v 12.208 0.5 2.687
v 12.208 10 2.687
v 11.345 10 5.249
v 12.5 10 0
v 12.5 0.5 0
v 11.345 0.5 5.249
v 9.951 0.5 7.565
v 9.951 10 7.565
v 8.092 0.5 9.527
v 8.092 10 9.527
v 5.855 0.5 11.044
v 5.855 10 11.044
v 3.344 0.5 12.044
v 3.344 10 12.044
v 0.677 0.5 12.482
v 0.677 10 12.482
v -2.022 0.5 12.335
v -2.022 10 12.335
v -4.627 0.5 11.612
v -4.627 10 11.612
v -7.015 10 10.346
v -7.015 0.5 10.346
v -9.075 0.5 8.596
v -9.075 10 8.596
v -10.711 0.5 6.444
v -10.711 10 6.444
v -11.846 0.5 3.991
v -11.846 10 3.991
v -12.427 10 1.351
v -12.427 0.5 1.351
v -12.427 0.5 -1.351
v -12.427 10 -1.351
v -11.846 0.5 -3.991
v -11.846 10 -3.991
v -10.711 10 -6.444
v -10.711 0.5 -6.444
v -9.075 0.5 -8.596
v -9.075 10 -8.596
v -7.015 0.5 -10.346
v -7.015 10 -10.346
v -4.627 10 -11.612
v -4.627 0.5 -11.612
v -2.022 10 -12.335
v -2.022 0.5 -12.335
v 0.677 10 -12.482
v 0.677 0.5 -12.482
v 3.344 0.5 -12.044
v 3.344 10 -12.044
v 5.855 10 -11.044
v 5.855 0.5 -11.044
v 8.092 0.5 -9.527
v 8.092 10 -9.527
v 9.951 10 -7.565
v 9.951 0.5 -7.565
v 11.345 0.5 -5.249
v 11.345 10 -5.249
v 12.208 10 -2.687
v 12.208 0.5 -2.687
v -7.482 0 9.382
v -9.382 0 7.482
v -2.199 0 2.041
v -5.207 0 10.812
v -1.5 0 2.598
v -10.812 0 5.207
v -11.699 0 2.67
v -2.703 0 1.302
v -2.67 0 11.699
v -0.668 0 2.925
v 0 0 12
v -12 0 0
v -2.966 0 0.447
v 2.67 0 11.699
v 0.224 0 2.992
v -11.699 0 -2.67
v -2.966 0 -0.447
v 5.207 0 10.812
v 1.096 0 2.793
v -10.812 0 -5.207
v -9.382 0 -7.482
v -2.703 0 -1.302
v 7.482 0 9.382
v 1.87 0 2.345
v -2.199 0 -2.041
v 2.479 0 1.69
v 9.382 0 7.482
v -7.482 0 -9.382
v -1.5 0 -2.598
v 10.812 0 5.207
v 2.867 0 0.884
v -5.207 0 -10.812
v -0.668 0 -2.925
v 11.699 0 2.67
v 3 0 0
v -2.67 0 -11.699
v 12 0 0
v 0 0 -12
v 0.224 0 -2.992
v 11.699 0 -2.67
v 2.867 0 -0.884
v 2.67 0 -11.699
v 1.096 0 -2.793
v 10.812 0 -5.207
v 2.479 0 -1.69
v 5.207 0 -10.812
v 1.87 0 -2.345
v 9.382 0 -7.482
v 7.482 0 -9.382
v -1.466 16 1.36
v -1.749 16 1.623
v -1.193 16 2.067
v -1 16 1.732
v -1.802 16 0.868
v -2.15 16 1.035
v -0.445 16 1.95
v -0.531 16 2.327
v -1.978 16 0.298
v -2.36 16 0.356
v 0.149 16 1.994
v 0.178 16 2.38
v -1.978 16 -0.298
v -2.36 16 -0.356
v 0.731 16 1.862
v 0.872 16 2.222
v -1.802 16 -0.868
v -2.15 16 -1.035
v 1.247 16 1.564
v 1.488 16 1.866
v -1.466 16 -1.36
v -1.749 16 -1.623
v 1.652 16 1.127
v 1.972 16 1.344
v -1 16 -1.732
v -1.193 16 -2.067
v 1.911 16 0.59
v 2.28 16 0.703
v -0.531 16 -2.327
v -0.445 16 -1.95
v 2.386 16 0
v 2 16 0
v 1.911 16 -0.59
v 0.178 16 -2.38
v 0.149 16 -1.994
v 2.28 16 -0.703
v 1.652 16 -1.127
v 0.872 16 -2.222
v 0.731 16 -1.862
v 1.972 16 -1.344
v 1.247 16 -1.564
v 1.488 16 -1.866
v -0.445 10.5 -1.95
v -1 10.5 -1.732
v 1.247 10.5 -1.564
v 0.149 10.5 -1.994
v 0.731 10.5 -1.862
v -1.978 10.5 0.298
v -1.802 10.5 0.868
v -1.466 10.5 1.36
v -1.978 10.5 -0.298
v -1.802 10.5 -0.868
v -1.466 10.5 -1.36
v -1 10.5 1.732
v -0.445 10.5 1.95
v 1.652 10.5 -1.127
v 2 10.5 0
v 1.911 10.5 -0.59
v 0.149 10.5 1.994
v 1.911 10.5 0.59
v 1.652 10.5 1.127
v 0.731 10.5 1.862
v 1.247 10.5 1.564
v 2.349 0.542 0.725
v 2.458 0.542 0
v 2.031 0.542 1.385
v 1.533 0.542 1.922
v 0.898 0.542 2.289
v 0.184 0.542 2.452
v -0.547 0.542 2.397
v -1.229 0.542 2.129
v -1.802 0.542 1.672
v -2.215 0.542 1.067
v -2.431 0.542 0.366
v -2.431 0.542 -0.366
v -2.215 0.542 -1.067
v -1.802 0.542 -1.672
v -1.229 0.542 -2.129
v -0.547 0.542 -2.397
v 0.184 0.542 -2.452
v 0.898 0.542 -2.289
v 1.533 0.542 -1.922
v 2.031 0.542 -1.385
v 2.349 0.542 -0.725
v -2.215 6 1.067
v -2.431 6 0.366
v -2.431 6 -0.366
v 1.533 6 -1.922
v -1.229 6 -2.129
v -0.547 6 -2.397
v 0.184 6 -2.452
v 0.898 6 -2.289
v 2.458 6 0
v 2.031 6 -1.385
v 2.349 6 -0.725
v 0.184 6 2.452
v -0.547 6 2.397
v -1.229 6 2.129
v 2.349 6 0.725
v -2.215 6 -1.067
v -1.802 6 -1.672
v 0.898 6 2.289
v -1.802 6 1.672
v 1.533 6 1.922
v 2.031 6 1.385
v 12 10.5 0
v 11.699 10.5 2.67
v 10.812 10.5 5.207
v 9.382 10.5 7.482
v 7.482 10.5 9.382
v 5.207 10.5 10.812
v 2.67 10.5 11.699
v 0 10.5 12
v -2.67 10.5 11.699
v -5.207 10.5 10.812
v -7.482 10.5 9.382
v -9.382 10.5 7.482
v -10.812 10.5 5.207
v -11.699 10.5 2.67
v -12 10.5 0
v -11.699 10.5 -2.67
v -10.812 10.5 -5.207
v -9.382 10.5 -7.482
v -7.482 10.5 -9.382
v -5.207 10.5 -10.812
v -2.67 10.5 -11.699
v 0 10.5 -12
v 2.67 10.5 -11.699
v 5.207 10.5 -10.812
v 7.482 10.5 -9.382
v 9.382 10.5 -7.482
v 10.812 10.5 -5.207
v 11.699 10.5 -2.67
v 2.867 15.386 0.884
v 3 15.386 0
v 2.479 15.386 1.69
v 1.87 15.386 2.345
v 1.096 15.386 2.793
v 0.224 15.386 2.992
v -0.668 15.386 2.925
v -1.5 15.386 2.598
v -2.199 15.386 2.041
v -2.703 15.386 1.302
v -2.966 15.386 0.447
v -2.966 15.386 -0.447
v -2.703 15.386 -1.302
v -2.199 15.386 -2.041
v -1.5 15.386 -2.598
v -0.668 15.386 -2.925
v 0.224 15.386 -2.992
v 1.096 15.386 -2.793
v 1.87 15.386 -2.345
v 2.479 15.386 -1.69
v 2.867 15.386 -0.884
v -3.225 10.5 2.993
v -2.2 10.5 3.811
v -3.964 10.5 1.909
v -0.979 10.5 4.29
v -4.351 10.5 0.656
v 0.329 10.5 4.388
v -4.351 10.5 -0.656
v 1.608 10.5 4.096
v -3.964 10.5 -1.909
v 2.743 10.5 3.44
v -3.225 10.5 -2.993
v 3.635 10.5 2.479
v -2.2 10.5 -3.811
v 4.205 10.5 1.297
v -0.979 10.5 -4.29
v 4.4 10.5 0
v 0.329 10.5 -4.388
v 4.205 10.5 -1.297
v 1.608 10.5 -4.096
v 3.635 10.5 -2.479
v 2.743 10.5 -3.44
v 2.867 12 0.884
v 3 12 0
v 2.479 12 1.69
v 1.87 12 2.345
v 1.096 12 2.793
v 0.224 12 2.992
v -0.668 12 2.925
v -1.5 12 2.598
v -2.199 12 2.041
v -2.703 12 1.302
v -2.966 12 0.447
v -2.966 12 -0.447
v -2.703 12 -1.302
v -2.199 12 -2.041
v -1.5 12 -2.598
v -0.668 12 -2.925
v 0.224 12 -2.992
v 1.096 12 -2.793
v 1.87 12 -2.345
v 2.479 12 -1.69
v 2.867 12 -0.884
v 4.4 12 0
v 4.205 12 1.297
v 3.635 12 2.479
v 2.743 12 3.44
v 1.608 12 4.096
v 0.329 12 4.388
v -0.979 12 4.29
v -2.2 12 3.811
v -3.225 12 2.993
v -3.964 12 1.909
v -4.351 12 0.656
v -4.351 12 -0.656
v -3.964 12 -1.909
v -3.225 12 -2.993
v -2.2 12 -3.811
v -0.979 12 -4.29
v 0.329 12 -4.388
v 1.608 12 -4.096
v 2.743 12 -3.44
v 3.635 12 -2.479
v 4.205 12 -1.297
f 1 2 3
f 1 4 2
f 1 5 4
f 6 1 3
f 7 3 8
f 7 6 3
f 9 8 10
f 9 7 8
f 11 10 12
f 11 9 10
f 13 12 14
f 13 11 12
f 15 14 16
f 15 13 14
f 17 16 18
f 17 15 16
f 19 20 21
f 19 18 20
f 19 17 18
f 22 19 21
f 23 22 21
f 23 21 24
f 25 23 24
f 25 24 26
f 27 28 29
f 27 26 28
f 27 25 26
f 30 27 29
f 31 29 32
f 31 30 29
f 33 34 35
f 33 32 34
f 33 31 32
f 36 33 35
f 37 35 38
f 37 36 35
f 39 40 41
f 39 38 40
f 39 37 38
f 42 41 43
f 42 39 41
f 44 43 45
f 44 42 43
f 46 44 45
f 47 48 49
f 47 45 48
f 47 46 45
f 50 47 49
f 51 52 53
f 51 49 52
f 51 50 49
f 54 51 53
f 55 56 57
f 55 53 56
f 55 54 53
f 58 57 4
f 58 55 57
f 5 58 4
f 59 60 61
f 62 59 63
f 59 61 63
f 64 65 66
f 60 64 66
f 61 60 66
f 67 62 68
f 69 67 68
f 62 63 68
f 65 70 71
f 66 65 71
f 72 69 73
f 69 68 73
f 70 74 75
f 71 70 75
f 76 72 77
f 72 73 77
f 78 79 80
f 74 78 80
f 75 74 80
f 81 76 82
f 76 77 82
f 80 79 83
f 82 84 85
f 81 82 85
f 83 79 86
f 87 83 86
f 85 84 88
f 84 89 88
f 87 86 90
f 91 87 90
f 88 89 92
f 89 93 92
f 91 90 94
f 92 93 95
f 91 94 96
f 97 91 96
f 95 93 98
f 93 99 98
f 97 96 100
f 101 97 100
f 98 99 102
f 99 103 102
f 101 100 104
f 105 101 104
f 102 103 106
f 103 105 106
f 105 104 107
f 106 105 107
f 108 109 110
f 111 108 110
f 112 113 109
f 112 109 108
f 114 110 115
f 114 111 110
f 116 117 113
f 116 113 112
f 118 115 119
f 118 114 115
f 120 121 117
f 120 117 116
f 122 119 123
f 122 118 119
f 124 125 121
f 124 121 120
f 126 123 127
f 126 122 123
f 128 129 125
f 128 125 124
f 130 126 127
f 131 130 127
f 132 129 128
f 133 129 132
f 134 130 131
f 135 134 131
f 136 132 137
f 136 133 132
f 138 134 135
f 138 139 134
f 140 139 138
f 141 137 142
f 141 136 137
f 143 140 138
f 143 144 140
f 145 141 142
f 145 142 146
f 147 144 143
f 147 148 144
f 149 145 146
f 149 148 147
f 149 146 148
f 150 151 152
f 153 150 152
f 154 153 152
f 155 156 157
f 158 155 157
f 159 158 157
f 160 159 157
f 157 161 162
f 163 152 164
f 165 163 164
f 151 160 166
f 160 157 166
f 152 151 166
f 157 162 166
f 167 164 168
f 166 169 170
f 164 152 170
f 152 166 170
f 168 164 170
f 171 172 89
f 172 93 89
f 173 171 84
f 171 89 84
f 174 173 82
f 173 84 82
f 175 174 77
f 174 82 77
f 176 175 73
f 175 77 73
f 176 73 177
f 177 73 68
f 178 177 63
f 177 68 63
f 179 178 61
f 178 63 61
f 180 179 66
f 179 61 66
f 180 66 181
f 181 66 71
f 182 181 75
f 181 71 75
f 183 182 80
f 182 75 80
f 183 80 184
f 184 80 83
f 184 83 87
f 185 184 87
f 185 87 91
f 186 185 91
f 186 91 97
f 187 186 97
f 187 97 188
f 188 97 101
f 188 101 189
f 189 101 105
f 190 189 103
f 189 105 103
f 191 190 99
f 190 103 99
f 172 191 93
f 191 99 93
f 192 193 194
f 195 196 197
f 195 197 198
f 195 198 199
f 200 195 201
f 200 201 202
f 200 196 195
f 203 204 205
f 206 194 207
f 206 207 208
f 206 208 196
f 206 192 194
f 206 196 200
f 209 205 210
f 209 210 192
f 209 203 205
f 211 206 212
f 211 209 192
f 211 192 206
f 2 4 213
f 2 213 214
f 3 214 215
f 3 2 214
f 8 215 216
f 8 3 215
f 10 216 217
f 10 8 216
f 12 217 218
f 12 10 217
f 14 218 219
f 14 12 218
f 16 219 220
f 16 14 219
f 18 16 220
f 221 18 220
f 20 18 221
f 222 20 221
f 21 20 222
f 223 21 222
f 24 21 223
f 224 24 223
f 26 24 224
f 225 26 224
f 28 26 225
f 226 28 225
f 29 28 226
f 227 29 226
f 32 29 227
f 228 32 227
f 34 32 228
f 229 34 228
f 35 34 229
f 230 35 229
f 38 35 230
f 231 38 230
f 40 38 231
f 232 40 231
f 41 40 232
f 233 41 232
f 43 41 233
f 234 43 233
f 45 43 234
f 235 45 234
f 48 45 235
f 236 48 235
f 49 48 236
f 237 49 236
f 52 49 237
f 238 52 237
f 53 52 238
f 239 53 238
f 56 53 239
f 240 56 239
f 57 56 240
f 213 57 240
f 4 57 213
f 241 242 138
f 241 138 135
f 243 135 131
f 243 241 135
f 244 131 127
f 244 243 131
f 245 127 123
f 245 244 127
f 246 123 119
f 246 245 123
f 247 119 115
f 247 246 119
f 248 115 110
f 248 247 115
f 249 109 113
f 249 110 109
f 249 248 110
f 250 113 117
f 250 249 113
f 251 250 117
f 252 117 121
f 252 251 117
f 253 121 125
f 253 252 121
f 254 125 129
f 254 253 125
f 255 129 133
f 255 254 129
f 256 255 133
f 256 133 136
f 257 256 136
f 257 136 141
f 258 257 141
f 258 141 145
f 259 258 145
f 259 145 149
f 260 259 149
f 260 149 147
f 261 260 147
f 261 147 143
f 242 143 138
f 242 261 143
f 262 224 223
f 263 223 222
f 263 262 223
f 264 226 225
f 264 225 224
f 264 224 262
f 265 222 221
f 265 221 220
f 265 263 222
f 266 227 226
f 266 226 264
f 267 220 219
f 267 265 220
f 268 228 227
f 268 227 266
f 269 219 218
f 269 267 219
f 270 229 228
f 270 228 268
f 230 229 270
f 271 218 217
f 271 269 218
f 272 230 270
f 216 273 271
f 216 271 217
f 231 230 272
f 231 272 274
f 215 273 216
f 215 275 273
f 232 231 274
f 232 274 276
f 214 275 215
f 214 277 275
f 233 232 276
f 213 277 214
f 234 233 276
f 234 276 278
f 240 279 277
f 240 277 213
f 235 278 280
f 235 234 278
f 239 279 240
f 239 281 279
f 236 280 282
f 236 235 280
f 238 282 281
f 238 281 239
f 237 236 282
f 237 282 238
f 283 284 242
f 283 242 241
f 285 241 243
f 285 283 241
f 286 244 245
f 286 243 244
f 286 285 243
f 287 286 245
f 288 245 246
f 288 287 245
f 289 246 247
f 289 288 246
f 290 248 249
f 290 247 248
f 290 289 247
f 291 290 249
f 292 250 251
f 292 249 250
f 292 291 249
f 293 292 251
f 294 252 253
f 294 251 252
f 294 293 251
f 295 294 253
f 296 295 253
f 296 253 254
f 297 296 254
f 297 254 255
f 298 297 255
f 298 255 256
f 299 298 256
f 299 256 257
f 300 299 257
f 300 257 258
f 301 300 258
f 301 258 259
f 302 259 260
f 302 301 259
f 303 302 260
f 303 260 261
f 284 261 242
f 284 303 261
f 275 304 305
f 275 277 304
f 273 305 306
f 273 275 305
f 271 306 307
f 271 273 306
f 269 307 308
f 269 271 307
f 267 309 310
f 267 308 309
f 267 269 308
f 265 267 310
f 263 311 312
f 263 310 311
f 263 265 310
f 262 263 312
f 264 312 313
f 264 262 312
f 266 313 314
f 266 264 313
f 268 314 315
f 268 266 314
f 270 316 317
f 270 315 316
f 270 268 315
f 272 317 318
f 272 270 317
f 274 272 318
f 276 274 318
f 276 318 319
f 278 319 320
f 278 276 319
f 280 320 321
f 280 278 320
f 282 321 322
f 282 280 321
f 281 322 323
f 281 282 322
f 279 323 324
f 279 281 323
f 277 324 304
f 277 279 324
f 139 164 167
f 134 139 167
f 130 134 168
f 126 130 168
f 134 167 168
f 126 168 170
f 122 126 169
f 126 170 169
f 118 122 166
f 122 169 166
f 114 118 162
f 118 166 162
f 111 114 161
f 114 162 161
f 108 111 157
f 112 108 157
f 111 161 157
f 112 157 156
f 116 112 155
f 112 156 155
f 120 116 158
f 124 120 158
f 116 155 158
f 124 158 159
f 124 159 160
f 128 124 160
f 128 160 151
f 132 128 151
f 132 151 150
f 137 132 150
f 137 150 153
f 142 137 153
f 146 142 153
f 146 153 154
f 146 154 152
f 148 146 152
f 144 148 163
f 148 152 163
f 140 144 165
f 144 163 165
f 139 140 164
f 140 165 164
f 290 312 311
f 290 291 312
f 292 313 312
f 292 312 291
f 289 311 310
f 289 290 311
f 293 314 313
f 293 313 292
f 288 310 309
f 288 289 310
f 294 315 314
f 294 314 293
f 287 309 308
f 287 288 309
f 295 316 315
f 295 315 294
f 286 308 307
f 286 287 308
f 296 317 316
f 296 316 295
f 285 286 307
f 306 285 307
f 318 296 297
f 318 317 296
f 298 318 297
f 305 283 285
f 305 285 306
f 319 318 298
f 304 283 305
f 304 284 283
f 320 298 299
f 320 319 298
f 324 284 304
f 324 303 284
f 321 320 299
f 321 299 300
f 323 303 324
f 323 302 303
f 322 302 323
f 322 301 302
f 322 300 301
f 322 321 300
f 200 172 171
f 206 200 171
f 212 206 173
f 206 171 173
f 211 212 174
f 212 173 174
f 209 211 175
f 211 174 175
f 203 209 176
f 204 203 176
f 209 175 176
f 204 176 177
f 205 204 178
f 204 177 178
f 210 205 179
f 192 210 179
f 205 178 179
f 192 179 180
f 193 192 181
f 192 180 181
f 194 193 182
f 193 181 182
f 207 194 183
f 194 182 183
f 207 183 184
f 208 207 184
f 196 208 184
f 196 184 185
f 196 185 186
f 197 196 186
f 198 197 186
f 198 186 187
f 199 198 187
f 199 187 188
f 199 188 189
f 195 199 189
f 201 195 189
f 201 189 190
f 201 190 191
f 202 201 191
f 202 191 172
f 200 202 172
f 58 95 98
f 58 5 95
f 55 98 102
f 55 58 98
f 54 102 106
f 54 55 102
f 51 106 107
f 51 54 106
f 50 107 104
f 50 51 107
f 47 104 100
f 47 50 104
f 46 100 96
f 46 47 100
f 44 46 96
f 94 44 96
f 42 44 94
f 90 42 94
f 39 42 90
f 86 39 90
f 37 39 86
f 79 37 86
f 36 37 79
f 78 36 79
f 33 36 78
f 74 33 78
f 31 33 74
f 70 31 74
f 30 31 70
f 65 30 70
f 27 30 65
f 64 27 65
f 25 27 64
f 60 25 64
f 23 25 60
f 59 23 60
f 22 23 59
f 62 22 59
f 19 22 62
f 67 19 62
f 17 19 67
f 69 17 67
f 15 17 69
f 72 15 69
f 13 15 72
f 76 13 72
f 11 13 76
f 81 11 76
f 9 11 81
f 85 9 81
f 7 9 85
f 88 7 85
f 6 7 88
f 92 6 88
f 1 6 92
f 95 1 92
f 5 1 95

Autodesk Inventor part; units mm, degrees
sketch "Sketch_6" plane through (0, 0, 0) normal (0, 0, 1) x (1, 0, 0)
  line L0 (0, 0) -> (0, 16)
  line L1 (0, 16) -> (2.3865, 16)
  line L2 (2.3865, 16) -> (3, 15.3865)
  line L3 (3, 15.3865) -> (3, 12)
  line L4 (3, 12) -> (4.4, 12)
  line L5 (4.4, 12) -> (4.4, 10.5)
  line L6 (4.4, 10.5) -> (12, 10.5)
  line L7 (12, 10.5) -> (12.5, 10)
  line L8 (12.5, 10) -> (12.5, 0.5)
  line L9 (12.5, 0.5) -> (12, 0)
  line L10 (12, 0) -> (0, 0)
  line L11 (0, 0) -> (0, 16)
revolve "Revolution1" add sketch "Sketch_6" angle 360 about axis through (0, 0, 0) along (0, 1, 0)
thread "Thread1" size "M6x1" class "6g" standard "ISO Metric profile" full length
sketch "Sketch_4" plane through (0, 0, 0) normal (0, 0, 1) x (1, 0, 0)
  line L0 (0, 0) -> (0, 6)
  line L1 (0, 6) -> (2.4585, 6)
  line L2 (2.4585, 6) -> (2.4585, 0.5415)
  line L3 (2.4585, 0.5415) -> (3, 0)
  line L4 (3, 0) -> (0, 0)
  line L5 (0, 0) -> (0, 6)
revolve "Revolution2" cut sketch "Sketch_4" angle 360 about axis through (0, 0, 0) along (0, -1, 0)
thread "Thread2" size "M6x1" class "6H" standard "ISO Metric profile" full length
sketch "Sketch_5" plane through (0, 0, 0) normal (0, 0, 1) x (1, 0, 0)
  line L0 (0, 10.5) -> (0, 16)
  line L1 (0, 16) -> (2, 16)
  line L2 (2, 16) -> (2, 10.5)
  line L3 (2, 10.5) -> (0, 10.5)
  line L4 (0, 10.5) -> (0, 16)
revolve "Revolution3" cut sketch "Sketch_5" angle 360 about axis through (0, 10.5, 0) along (0, -1, 0)
ref_plane "oben_XY" through (0, 12, 0) normal (0, 1, 0) x (1, 0, 0)
ref_plane "oben_YZ" through (0, 12, 0) normal (1, 0, 0) x (0, 0, -1)
ref_plane "oben_ZX" through (0, 12, 0) normal (0, 0, -1) x (0, 1, 0)
ref_plane "unten_XY" through (0, 0, 0) normal (0, 1, 0) x (1, 0, 0)
ref_plane "unten_YZ" through (0, 0, 0) normal (1, 0, 0) x (0, 0, -1)
ref_plane "unten_ZX" through (0, 0, 0) normal (0, 0, -1) x (0, 1, 0)
properties part number "191203 ESF-4A"
